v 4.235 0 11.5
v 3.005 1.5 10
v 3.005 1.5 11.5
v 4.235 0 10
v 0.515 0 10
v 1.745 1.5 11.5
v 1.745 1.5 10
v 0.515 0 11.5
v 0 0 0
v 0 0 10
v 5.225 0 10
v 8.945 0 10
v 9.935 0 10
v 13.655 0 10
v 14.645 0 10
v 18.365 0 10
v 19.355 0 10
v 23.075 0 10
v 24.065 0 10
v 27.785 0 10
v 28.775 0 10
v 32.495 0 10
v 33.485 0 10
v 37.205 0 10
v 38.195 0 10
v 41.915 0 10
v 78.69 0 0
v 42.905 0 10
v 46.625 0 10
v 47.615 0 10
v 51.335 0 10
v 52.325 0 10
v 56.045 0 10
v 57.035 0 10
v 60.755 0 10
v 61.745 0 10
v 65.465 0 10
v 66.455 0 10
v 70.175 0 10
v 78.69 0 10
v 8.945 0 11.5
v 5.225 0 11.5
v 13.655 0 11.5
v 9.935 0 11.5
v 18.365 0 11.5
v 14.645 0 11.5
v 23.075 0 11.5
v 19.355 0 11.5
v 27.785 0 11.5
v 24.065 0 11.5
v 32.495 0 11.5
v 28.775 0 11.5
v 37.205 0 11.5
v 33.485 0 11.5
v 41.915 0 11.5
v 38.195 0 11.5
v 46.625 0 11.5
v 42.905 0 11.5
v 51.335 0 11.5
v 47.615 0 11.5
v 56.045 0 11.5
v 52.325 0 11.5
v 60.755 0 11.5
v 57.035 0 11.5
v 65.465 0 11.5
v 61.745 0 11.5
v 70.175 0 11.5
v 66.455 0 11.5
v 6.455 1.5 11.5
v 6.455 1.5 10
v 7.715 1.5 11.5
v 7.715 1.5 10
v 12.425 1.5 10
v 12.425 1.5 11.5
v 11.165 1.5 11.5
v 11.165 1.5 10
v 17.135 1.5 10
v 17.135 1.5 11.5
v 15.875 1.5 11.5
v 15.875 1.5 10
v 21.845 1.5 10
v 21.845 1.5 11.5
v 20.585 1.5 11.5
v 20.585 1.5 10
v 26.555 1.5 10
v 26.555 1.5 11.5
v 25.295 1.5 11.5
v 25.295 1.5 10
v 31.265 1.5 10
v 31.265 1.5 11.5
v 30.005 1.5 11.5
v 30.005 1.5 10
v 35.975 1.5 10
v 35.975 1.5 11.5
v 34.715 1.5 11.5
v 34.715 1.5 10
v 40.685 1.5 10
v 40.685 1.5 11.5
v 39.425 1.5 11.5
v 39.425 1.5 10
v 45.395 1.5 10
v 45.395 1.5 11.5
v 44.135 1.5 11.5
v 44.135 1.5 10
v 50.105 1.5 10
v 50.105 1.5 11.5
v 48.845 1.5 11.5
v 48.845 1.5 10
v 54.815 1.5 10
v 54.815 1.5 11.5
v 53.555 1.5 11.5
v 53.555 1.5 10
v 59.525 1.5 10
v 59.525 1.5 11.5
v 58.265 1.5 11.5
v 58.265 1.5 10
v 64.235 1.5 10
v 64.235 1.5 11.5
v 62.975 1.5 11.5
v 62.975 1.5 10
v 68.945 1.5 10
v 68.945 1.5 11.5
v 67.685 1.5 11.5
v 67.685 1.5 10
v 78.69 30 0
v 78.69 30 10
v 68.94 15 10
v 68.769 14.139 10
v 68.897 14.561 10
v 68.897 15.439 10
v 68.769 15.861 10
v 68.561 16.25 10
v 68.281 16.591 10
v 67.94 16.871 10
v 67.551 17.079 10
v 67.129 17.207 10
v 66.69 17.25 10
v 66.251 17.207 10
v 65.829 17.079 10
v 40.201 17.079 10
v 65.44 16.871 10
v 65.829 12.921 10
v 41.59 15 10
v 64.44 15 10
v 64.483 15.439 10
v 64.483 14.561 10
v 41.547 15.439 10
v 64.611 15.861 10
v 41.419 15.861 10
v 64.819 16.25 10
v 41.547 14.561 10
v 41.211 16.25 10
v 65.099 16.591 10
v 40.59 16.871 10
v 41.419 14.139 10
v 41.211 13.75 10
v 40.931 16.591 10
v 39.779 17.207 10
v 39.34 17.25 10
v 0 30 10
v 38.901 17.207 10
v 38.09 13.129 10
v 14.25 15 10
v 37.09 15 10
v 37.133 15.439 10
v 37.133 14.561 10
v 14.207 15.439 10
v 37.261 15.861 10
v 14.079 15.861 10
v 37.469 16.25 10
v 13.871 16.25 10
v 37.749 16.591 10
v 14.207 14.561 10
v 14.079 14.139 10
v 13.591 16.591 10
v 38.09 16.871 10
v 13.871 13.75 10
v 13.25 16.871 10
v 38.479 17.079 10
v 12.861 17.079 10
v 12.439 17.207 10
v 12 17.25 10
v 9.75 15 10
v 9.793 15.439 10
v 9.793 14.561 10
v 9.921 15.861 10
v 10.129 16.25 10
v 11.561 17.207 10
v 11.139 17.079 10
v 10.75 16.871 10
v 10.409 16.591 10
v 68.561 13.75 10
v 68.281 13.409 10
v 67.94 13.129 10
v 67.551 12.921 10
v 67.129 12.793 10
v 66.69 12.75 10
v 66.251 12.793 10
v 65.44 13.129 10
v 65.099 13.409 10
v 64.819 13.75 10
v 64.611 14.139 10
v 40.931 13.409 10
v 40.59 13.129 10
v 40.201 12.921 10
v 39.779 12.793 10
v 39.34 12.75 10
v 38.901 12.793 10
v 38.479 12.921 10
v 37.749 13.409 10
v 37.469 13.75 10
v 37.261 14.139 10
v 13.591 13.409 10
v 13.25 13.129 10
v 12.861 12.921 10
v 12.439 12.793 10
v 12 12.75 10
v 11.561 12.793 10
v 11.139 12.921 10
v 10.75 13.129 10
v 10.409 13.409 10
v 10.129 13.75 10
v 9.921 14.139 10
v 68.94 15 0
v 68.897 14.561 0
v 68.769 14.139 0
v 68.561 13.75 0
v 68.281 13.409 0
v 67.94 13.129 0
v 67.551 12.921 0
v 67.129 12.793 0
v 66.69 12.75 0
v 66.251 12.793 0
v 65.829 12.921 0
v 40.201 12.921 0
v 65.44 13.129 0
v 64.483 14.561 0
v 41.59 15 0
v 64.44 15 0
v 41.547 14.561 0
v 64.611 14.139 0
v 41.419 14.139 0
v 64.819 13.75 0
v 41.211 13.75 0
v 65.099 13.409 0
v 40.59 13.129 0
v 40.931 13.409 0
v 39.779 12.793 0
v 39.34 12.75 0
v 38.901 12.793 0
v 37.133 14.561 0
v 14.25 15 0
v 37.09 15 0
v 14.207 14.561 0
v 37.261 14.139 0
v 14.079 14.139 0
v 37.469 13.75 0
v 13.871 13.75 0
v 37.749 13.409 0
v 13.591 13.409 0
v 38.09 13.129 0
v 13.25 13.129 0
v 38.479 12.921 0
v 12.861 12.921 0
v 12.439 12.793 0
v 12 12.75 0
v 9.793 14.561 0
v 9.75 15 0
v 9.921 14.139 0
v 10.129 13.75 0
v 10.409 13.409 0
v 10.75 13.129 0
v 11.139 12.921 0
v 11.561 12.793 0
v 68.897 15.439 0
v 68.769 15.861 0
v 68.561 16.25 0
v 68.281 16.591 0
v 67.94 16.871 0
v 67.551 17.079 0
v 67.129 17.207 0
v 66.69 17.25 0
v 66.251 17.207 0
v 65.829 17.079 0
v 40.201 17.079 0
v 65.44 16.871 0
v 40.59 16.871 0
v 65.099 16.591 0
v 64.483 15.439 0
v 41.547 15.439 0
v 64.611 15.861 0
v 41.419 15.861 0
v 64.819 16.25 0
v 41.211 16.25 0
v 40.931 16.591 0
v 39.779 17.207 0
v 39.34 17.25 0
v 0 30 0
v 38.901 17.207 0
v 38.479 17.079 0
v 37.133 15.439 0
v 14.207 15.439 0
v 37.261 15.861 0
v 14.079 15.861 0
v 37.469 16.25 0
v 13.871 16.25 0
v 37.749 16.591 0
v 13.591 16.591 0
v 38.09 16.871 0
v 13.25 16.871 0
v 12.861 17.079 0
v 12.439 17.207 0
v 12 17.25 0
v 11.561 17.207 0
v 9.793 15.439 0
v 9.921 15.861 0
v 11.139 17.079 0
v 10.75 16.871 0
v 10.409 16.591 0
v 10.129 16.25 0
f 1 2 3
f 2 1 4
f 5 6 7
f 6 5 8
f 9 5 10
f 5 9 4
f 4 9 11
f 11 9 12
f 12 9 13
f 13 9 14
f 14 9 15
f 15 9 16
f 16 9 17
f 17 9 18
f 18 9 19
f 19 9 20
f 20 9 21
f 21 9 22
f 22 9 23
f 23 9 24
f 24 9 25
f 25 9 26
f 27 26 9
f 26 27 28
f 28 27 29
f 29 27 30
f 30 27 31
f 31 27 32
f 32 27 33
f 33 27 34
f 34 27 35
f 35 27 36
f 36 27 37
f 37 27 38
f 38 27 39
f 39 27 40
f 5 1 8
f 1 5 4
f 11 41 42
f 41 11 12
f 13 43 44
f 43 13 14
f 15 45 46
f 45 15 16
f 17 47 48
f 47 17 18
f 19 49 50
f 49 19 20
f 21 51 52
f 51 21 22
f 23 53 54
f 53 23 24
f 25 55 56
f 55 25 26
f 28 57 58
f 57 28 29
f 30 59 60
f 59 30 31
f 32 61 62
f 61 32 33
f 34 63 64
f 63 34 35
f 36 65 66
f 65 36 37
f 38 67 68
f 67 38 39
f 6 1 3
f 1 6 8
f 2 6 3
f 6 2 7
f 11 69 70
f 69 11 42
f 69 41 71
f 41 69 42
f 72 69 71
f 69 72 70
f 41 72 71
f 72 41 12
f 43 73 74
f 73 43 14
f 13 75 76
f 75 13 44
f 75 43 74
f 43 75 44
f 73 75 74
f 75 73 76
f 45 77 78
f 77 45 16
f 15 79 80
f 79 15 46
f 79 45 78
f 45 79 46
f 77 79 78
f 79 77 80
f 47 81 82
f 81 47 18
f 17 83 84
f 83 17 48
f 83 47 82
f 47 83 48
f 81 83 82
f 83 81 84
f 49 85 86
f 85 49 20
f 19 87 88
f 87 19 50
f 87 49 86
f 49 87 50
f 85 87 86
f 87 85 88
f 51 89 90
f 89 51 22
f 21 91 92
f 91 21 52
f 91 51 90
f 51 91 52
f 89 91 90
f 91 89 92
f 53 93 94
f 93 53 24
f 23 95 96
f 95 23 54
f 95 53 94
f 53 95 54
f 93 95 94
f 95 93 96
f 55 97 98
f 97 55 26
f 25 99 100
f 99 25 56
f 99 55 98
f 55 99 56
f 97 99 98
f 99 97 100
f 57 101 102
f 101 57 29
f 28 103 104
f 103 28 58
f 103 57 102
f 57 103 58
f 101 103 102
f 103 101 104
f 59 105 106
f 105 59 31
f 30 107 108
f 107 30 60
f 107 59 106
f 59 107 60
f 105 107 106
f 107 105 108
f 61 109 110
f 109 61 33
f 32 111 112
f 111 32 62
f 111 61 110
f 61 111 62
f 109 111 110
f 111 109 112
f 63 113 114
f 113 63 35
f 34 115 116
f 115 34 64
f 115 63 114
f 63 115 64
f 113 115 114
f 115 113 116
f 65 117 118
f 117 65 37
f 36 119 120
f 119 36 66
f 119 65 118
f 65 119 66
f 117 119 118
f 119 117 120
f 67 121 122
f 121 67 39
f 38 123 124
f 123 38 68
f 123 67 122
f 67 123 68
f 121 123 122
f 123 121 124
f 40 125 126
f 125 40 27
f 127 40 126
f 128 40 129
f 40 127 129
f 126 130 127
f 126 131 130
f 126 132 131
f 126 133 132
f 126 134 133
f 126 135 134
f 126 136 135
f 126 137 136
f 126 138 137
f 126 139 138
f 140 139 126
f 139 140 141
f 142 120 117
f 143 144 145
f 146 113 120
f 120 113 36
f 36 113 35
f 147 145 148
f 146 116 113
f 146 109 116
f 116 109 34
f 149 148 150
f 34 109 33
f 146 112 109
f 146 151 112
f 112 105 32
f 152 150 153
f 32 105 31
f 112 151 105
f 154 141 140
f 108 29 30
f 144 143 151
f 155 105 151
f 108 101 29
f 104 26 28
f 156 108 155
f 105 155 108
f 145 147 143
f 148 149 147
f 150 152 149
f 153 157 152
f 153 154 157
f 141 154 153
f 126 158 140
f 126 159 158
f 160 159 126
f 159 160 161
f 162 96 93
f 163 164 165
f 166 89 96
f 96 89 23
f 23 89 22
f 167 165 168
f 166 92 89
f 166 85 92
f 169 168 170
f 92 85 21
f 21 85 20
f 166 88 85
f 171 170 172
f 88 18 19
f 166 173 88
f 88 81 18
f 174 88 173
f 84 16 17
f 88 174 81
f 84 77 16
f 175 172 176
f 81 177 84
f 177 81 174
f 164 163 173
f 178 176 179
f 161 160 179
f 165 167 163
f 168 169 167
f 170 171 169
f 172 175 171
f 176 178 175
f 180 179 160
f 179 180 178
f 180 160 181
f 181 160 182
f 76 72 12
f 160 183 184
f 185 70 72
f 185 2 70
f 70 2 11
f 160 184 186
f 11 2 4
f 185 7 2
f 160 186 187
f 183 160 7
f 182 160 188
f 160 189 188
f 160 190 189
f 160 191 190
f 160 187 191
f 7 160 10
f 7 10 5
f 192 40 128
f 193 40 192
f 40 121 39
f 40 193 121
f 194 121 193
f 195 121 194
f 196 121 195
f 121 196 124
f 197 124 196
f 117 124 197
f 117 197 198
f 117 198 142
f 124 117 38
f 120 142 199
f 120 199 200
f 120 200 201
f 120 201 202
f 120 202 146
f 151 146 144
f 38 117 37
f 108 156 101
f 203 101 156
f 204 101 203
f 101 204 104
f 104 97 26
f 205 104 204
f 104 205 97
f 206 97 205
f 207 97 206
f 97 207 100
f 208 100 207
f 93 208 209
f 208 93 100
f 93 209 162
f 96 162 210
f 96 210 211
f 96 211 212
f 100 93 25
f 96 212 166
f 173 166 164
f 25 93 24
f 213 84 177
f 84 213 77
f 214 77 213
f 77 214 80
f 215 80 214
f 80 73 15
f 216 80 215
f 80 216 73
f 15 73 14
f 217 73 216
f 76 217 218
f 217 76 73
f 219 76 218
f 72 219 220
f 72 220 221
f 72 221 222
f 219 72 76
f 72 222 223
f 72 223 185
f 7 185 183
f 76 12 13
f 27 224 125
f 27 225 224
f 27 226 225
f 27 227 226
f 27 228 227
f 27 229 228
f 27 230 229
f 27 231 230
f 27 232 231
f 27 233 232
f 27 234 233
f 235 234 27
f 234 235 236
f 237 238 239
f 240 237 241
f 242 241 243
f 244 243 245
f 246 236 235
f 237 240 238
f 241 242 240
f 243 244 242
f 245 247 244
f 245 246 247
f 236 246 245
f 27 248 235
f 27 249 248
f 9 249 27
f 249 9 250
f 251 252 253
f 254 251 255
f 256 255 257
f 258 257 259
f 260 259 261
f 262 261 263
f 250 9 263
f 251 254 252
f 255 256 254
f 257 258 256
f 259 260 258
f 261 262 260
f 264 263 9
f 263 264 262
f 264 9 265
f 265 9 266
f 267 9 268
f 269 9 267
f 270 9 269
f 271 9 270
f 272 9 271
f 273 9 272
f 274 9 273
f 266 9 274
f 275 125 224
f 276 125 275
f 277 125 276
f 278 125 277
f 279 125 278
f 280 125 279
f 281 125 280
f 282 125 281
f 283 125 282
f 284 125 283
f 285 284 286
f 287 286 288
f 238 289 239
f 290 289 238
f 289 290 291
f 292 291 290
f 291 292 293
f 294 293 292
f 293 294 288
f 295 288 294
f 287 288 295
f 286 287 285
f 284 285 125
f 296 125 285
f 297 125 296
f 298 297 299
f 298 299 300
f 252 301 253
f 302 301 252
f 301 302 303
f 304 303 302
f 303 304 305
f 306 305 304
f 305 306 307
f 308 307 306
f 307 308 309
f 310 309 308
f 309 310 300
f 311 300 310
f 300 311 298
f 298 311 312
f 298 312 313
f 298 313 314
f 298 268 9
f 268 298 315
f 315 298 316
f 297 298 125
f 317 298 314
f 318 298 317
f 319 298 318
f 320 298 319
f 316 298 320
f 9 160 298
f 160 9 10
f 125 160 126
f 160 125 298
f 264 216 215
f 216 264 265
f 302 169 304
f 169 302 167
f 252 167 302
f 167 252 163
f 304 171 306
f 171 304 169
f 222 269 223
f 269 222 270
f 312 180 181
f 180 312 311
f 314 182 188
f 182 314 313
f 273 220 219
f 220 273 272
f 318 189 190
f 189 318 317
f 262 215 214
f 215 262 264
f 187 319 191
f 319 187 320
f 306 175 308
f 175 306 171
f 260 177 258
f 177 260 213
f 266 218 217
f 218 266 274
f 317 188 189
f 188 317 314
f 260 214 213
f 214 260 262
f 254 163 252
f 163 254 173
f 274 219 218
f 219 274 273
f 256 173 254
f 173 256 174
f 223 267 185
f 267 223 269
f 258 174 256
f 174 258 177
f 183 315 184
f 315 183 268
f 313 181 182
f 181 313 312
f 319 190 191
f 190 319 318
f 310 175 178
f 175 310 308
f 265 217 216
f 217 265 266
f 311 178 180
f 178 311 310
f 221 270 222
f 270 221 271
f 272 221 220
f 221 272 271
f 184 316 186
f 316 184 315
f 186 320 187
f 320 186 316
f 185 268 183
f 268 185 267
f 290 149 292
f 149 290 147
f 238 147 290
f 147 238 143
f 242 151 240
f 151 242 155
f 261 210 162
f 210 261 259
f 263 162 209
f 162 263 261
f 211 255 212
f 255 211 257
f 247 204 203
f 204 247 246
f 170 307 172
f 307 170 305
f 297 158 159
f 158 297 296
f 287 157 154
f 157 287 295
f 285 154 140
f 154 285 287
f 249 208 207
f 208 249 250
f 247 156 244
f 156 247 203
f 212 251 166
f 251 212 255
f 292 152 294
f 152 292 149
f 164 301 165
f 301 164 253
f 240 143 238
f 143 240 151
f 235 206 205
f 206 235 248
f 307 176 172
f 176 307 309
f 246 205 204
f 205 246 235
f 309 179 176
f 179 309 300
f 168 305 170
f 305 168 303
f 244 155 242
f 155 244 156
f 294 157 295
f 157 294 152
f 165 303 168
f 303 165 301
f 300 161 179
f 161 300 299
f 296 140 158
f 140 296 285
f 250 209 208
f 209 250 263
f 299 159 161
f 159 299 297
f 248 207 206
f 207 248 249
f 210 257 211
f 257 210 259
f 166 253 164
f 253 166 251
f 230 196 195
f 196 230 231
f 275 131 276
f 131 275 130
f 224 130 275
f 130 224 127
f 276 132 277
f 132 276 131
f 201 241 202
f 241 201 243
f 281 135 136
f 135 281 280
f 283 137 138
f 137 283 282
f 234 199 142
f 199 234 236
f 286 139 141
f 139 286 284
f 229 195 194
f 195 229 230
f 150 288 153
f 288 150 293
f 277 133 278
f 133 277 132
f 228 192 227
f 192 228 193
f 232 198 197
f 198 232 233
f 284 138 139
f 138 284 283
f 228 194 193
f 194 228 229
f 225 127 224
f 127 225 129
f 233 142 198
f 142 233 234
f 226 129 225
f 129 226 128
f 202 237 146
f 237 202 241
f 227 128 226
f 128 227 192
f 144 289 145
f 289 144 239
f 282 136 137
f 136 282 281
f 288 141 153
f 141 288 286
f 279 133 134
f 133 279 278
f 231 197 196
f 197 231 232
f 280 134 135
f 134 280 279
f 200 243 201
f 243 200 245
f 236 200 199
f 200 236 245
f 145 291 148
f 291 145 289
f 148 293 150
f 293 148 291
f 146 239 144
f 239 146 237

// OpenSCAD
$fn = 32;

// ----------------------------------------------------------------------
// Gear rack: m=1.5 z=15, 78.69 x 30 x 11.5 mm
// ----------------------------------------------------------------------

// --- parameters (mm) ---
rack_len = 78.69;         // rack length, X
rack_w = 30;              // rack width, Y
rack_h = 11.5;            // overall height, Z
modul = 1.5;              // module
body_t = 10;              // tooth root line height
pitch = 4.71;             // circular pitch
tip_w = 1.26;             // tooth thickness at the tip
root_w = 3.72;            // tooth thickness at the root line
hole_d = 4.5;             // mounting hole
sink = 0.6;               // tooth root overlap into the body

tooth_span = 70.69;

module tooth(x0) {
  /* 20 deg flank profile, sunk into the body for a positive overlap */
  translate([x0, 0, body_t - sink])
    linear_extrude(height = rack_h - body_t + sink)
      polygon(points = [[-root_w / 2, 0], [root_w / 2, 0],
                        [tip_w / 2, rack_h - body_t],
                        [-tip_w / 2, rack_h - body_t]]);
}

difference() {
  union() {
    cube([rack_len, rack_w, body_t]);
    for (i = [0 : 15 - 1])
      tooth((i + 0.5) * pitch + (tooth_span - 15 * pitch) / 2);
  }
  translate([12, 15, -1]) cylinder(h = body_t + 2, d = hole_d);
  translate([39.34, 15, -1]) cylinder(h = body_t + 2, d = hole_d);
  translate([66.69, 15, -1]) cylinder(h = body_t + 2, d = hole_d);
}
